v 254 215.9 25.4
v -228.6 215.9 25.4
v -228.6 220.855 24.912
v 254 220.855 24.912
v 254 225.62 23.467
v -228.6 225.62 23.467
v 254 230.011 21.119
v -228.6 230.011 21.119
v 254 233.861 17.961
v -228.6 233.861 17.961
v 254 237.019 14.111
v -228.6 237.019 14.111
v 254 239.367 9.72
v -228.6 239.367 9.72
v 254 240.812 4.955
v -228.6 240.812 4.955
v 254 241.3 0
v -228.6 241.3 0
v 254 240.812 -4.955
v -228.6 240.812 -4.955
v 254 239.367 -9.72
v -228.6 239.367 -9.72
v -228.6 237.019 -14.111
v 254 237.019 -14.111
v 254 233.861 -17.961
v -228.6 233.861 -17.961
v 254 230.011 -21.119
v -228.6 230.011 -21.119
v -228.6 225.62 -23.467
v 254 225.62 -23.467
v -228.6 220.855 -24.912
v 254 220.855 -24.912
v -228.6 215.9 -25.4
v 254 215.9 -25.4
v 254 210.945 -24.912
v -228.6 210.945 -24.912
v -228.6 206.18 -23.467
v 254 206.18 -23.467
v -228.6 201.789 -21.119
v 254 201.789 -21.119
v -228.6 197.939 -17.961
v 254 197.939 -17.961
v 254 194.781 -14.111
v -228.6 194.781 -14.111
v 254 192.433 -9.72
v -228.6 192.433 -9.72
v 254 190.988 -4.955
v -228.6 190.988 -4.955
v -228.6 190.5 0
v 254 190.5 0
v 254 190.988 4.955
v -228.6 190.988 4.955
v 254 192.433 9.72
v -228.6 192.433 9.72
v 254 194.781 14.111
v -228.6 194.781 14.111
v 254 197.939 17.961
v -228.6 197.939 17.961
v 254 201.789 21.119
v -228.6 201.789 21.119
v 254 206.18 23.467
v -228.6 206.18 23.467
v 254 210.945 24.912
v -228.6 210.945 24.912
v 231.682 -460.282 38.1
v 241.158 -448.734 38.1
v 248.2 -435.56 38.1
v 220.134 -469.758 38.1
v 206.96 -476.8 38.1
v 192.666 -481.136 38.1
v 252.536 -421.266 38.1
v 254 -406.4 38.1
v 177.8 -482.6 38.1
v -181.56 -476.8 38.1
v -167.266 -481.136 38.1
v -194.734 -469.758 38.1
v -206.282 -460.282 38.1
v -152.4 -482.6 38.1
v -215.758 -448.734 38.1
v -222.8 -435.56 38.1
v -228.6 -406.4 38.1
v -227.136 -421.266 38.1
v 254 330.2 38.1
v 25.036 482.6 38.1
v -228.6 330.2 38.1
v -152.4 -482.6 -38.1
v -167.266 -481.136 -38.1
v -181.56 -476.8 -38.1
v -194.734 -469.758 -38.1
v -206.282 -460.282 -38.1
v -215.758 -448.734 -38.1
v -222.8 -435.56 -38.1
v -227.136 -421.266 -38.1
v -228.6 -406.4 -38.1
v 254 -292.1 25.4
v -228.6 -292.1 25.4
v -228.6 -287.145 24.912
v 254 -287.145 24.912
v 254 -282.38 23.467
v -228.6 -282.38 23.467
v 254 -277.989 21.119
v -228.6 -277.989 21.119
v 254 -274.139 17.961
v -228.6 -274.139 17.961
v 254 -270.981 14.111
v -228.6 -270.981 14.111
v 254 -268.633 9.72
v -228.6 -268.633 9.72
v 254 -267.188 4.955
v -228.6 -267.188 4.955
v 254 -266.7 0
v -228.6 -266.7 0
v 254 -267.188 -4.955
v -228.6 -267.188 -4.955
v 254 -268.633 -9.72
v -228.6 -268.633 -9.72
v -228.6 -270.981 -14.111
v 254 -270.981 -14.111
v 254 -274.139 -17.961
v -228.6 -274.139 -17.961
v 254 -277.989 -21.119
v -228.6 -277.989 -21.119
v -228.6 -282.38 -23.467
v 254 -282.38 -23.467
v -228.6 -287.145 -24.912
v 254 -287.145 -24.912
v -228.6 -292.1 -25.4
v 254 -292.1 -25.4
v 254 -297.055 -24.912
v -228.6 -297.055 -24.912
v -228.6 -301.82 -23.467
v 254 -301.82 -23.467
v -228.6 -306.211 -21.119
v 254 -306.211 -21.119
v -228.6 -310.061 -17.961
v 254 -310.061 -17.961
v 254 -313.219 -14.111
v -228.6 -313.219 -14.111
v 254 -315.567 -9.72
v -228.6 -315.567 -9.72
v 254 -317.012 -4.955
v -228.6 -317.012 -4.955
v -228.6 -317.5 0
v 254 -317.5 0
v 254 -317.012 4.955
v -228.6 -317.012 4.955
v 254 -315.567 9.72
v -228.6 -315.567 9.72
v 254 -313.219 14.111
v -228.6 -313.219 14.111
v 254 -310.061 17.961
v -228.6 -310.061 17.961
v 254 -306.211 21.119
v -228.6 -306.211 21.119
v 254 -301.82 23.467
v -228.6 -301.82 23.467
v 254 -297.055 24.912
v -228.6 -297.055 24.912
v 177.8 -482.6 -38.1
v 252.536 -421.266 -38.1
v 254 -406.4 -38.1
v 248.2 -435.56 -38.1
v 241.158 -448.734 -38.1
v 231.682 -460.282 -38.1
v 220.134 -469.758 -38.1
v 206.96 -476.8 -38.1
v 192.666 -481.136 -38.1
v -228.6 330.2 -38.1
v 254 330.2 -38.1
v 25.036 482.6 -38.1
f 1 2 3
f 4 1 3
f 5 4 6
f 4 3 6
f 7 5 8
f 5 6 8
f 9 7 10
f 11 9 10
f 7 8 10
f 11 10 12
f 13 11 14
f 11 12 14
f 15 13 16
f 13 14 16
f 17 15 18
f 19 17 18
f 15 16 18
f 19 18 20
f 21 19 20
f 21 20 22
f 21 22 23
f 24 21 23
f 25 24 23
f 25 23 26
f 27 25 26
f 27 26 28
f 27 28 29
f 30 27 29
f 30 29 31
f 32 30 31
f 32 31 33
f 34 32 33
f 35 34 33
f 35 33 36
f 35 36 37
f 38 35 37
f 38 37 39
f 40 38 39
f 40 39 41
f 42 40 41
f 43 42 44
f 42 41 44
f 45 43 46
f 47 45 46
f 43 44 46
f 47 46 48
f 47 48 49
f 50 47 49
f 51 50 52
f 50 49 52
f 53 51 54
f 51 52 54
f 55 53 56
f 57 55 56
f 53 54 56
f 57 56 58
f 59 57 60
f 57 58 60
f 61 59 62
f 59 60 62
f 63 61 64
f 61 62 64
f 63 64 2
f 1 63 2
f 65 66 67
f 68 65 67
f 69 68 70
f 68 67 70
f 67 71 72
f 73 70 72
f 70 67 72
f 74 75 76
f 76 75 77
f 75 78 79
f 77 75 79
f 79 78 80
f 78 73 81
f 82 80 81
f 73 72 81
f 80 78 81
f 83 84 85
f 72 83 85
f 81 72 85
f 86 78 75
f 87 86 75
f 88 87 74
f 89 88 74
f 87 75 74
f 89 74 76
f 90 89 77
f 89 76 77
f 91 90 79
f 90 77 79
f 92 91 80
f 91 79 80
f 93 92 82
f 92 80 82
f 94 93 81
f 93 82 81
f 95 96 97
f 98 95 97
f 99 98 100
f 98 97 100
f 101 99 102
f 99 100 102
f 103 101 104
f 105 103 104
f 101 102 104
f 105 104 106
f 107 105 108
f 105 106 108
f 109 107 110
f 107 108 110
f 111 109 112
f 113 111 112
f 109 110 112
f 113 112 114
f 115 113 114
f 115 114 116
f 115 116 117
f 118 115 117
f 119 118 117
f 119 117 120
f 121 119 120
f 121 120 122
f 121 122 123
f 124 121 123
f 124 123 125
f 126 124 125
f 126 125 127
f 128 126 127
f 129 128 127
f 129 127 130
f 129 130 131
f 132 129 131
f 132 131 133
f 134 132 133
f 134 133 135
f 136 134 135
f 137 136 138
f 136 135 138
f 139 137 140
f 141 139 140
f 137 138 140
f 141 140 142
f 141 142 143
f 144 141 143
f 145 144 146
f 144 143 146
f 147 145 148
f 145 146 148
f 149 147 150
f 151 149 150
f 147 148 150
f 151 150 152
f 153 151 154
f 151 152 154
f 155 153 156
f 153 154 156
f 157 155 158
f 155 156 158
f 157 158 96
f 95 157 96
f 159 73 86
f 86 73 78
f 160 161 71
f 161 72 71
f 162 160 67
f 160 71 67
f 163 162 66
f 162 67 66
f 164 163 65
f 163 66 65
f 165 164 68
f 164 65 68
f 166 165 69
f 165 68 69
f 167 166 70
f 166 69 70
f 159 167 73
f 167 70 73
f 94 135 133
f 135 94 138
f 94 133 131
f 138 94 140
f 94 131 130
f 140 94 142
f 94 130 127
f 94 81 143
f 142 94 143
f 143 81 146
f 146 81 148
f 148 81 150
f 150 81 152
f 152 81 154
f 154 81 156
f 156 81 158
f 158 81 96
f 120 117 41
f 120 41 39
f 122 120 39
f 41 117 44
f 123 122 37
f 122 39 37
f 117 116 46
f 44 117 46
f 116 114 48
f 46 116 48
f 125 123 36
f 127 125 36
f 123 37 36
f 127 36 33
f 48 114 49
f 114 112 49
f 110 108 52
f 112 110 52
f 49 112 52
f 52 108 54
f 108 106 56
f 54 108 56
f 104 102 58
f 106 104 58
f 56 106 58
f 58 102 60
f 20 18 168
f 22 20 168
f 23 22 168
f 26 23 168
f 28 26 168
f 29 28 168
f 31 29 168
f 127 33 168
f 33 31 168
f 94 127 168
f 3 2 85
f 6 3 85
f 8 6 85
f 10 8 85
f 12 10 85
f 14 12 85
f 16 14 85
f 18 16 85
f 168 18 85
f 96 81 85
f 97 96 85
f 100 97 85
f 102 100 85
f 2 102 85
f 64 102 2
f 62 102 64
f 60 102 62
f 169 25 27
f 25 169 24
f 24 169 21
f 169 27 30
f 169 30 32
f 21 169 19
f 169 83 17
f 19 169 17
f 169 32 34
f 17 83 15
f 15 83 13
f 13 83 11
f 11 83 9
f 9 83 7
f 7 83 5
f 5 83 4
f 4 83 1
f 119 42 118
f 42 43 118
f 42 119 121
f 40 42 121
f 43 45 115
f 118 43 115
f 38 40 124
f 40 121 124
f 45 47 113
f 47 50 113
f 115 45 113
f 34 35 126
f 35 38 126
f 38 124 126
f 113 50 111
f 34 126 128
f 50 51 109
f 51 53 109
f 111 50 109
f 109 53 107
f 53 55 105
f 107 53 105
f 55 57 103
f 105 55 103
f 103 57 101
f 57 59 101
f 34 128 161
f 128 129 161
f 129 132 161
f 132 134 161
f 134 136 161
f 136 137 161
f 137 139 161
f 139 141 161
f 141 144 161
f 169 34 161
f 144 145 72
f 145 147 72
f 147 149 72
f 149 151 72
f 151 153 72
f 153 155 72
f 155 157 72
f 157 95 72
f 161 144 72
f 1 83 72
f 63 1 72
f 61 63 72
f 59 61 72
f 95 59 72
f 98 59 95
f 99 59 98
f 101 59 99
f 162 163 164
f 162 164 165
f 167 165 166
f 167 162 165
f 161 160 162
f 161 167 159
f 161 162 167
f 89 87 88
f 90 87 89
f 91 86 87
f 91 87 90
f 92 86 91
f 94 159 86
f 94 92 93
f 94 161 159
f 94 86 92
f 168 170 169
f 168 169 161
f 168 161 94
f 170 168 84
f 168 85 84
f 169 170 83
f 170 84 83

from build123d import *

# Parameters (mm, degrees)
BOSS_EXTRUDE1_DEPTH = 38.1
SKETCH4_R           = 25.4
CUT_EXTRUDE1_DEPTH  = 684.562089353


with BuildPart() as part:
    # Sketch3 → Boss-Extrude1 (new, symmetric)
    with BuildSketch(Plane.XY):
        with BuildLine():
            Line((-228.6, -406.4), (-228.6, 330.2))
            Line((-228.6, 330.2), (25.03619311, 482.6))
            Line((25.03619311, 482.6), (254, 330.2))
            Line((254, 330.2), (254, -406.4))
            ThreePointArc((254, -406.4), (231.681536726, -460.281536726), (177.8, -482.6))
            Line((177.8, -482.6), (-152.4, -482.6))
            ThreePointArc((-152.4, -482.6), (-206.281536726, -460.281536726), (-228.6, -406.4))
        make_face()
    extrude(amount=BOSS_EXTRUDE1_DEPTH, both=True)

    # Sketch4 → Cut-Extrude1 (cut, through all)
    with BuildSketch(Plane.ZY.offset(228.6)):
        with Locations((0, 215.9)):
            Circle(SKETCH4_R)
        with Locations((0, -292.1)):
            Circle(SKETCH4_R)
    extrude(amount=-CUT_EXTRUDE1_DEPTH, mode=Mode.SUBTRACT)


solid = part.part
